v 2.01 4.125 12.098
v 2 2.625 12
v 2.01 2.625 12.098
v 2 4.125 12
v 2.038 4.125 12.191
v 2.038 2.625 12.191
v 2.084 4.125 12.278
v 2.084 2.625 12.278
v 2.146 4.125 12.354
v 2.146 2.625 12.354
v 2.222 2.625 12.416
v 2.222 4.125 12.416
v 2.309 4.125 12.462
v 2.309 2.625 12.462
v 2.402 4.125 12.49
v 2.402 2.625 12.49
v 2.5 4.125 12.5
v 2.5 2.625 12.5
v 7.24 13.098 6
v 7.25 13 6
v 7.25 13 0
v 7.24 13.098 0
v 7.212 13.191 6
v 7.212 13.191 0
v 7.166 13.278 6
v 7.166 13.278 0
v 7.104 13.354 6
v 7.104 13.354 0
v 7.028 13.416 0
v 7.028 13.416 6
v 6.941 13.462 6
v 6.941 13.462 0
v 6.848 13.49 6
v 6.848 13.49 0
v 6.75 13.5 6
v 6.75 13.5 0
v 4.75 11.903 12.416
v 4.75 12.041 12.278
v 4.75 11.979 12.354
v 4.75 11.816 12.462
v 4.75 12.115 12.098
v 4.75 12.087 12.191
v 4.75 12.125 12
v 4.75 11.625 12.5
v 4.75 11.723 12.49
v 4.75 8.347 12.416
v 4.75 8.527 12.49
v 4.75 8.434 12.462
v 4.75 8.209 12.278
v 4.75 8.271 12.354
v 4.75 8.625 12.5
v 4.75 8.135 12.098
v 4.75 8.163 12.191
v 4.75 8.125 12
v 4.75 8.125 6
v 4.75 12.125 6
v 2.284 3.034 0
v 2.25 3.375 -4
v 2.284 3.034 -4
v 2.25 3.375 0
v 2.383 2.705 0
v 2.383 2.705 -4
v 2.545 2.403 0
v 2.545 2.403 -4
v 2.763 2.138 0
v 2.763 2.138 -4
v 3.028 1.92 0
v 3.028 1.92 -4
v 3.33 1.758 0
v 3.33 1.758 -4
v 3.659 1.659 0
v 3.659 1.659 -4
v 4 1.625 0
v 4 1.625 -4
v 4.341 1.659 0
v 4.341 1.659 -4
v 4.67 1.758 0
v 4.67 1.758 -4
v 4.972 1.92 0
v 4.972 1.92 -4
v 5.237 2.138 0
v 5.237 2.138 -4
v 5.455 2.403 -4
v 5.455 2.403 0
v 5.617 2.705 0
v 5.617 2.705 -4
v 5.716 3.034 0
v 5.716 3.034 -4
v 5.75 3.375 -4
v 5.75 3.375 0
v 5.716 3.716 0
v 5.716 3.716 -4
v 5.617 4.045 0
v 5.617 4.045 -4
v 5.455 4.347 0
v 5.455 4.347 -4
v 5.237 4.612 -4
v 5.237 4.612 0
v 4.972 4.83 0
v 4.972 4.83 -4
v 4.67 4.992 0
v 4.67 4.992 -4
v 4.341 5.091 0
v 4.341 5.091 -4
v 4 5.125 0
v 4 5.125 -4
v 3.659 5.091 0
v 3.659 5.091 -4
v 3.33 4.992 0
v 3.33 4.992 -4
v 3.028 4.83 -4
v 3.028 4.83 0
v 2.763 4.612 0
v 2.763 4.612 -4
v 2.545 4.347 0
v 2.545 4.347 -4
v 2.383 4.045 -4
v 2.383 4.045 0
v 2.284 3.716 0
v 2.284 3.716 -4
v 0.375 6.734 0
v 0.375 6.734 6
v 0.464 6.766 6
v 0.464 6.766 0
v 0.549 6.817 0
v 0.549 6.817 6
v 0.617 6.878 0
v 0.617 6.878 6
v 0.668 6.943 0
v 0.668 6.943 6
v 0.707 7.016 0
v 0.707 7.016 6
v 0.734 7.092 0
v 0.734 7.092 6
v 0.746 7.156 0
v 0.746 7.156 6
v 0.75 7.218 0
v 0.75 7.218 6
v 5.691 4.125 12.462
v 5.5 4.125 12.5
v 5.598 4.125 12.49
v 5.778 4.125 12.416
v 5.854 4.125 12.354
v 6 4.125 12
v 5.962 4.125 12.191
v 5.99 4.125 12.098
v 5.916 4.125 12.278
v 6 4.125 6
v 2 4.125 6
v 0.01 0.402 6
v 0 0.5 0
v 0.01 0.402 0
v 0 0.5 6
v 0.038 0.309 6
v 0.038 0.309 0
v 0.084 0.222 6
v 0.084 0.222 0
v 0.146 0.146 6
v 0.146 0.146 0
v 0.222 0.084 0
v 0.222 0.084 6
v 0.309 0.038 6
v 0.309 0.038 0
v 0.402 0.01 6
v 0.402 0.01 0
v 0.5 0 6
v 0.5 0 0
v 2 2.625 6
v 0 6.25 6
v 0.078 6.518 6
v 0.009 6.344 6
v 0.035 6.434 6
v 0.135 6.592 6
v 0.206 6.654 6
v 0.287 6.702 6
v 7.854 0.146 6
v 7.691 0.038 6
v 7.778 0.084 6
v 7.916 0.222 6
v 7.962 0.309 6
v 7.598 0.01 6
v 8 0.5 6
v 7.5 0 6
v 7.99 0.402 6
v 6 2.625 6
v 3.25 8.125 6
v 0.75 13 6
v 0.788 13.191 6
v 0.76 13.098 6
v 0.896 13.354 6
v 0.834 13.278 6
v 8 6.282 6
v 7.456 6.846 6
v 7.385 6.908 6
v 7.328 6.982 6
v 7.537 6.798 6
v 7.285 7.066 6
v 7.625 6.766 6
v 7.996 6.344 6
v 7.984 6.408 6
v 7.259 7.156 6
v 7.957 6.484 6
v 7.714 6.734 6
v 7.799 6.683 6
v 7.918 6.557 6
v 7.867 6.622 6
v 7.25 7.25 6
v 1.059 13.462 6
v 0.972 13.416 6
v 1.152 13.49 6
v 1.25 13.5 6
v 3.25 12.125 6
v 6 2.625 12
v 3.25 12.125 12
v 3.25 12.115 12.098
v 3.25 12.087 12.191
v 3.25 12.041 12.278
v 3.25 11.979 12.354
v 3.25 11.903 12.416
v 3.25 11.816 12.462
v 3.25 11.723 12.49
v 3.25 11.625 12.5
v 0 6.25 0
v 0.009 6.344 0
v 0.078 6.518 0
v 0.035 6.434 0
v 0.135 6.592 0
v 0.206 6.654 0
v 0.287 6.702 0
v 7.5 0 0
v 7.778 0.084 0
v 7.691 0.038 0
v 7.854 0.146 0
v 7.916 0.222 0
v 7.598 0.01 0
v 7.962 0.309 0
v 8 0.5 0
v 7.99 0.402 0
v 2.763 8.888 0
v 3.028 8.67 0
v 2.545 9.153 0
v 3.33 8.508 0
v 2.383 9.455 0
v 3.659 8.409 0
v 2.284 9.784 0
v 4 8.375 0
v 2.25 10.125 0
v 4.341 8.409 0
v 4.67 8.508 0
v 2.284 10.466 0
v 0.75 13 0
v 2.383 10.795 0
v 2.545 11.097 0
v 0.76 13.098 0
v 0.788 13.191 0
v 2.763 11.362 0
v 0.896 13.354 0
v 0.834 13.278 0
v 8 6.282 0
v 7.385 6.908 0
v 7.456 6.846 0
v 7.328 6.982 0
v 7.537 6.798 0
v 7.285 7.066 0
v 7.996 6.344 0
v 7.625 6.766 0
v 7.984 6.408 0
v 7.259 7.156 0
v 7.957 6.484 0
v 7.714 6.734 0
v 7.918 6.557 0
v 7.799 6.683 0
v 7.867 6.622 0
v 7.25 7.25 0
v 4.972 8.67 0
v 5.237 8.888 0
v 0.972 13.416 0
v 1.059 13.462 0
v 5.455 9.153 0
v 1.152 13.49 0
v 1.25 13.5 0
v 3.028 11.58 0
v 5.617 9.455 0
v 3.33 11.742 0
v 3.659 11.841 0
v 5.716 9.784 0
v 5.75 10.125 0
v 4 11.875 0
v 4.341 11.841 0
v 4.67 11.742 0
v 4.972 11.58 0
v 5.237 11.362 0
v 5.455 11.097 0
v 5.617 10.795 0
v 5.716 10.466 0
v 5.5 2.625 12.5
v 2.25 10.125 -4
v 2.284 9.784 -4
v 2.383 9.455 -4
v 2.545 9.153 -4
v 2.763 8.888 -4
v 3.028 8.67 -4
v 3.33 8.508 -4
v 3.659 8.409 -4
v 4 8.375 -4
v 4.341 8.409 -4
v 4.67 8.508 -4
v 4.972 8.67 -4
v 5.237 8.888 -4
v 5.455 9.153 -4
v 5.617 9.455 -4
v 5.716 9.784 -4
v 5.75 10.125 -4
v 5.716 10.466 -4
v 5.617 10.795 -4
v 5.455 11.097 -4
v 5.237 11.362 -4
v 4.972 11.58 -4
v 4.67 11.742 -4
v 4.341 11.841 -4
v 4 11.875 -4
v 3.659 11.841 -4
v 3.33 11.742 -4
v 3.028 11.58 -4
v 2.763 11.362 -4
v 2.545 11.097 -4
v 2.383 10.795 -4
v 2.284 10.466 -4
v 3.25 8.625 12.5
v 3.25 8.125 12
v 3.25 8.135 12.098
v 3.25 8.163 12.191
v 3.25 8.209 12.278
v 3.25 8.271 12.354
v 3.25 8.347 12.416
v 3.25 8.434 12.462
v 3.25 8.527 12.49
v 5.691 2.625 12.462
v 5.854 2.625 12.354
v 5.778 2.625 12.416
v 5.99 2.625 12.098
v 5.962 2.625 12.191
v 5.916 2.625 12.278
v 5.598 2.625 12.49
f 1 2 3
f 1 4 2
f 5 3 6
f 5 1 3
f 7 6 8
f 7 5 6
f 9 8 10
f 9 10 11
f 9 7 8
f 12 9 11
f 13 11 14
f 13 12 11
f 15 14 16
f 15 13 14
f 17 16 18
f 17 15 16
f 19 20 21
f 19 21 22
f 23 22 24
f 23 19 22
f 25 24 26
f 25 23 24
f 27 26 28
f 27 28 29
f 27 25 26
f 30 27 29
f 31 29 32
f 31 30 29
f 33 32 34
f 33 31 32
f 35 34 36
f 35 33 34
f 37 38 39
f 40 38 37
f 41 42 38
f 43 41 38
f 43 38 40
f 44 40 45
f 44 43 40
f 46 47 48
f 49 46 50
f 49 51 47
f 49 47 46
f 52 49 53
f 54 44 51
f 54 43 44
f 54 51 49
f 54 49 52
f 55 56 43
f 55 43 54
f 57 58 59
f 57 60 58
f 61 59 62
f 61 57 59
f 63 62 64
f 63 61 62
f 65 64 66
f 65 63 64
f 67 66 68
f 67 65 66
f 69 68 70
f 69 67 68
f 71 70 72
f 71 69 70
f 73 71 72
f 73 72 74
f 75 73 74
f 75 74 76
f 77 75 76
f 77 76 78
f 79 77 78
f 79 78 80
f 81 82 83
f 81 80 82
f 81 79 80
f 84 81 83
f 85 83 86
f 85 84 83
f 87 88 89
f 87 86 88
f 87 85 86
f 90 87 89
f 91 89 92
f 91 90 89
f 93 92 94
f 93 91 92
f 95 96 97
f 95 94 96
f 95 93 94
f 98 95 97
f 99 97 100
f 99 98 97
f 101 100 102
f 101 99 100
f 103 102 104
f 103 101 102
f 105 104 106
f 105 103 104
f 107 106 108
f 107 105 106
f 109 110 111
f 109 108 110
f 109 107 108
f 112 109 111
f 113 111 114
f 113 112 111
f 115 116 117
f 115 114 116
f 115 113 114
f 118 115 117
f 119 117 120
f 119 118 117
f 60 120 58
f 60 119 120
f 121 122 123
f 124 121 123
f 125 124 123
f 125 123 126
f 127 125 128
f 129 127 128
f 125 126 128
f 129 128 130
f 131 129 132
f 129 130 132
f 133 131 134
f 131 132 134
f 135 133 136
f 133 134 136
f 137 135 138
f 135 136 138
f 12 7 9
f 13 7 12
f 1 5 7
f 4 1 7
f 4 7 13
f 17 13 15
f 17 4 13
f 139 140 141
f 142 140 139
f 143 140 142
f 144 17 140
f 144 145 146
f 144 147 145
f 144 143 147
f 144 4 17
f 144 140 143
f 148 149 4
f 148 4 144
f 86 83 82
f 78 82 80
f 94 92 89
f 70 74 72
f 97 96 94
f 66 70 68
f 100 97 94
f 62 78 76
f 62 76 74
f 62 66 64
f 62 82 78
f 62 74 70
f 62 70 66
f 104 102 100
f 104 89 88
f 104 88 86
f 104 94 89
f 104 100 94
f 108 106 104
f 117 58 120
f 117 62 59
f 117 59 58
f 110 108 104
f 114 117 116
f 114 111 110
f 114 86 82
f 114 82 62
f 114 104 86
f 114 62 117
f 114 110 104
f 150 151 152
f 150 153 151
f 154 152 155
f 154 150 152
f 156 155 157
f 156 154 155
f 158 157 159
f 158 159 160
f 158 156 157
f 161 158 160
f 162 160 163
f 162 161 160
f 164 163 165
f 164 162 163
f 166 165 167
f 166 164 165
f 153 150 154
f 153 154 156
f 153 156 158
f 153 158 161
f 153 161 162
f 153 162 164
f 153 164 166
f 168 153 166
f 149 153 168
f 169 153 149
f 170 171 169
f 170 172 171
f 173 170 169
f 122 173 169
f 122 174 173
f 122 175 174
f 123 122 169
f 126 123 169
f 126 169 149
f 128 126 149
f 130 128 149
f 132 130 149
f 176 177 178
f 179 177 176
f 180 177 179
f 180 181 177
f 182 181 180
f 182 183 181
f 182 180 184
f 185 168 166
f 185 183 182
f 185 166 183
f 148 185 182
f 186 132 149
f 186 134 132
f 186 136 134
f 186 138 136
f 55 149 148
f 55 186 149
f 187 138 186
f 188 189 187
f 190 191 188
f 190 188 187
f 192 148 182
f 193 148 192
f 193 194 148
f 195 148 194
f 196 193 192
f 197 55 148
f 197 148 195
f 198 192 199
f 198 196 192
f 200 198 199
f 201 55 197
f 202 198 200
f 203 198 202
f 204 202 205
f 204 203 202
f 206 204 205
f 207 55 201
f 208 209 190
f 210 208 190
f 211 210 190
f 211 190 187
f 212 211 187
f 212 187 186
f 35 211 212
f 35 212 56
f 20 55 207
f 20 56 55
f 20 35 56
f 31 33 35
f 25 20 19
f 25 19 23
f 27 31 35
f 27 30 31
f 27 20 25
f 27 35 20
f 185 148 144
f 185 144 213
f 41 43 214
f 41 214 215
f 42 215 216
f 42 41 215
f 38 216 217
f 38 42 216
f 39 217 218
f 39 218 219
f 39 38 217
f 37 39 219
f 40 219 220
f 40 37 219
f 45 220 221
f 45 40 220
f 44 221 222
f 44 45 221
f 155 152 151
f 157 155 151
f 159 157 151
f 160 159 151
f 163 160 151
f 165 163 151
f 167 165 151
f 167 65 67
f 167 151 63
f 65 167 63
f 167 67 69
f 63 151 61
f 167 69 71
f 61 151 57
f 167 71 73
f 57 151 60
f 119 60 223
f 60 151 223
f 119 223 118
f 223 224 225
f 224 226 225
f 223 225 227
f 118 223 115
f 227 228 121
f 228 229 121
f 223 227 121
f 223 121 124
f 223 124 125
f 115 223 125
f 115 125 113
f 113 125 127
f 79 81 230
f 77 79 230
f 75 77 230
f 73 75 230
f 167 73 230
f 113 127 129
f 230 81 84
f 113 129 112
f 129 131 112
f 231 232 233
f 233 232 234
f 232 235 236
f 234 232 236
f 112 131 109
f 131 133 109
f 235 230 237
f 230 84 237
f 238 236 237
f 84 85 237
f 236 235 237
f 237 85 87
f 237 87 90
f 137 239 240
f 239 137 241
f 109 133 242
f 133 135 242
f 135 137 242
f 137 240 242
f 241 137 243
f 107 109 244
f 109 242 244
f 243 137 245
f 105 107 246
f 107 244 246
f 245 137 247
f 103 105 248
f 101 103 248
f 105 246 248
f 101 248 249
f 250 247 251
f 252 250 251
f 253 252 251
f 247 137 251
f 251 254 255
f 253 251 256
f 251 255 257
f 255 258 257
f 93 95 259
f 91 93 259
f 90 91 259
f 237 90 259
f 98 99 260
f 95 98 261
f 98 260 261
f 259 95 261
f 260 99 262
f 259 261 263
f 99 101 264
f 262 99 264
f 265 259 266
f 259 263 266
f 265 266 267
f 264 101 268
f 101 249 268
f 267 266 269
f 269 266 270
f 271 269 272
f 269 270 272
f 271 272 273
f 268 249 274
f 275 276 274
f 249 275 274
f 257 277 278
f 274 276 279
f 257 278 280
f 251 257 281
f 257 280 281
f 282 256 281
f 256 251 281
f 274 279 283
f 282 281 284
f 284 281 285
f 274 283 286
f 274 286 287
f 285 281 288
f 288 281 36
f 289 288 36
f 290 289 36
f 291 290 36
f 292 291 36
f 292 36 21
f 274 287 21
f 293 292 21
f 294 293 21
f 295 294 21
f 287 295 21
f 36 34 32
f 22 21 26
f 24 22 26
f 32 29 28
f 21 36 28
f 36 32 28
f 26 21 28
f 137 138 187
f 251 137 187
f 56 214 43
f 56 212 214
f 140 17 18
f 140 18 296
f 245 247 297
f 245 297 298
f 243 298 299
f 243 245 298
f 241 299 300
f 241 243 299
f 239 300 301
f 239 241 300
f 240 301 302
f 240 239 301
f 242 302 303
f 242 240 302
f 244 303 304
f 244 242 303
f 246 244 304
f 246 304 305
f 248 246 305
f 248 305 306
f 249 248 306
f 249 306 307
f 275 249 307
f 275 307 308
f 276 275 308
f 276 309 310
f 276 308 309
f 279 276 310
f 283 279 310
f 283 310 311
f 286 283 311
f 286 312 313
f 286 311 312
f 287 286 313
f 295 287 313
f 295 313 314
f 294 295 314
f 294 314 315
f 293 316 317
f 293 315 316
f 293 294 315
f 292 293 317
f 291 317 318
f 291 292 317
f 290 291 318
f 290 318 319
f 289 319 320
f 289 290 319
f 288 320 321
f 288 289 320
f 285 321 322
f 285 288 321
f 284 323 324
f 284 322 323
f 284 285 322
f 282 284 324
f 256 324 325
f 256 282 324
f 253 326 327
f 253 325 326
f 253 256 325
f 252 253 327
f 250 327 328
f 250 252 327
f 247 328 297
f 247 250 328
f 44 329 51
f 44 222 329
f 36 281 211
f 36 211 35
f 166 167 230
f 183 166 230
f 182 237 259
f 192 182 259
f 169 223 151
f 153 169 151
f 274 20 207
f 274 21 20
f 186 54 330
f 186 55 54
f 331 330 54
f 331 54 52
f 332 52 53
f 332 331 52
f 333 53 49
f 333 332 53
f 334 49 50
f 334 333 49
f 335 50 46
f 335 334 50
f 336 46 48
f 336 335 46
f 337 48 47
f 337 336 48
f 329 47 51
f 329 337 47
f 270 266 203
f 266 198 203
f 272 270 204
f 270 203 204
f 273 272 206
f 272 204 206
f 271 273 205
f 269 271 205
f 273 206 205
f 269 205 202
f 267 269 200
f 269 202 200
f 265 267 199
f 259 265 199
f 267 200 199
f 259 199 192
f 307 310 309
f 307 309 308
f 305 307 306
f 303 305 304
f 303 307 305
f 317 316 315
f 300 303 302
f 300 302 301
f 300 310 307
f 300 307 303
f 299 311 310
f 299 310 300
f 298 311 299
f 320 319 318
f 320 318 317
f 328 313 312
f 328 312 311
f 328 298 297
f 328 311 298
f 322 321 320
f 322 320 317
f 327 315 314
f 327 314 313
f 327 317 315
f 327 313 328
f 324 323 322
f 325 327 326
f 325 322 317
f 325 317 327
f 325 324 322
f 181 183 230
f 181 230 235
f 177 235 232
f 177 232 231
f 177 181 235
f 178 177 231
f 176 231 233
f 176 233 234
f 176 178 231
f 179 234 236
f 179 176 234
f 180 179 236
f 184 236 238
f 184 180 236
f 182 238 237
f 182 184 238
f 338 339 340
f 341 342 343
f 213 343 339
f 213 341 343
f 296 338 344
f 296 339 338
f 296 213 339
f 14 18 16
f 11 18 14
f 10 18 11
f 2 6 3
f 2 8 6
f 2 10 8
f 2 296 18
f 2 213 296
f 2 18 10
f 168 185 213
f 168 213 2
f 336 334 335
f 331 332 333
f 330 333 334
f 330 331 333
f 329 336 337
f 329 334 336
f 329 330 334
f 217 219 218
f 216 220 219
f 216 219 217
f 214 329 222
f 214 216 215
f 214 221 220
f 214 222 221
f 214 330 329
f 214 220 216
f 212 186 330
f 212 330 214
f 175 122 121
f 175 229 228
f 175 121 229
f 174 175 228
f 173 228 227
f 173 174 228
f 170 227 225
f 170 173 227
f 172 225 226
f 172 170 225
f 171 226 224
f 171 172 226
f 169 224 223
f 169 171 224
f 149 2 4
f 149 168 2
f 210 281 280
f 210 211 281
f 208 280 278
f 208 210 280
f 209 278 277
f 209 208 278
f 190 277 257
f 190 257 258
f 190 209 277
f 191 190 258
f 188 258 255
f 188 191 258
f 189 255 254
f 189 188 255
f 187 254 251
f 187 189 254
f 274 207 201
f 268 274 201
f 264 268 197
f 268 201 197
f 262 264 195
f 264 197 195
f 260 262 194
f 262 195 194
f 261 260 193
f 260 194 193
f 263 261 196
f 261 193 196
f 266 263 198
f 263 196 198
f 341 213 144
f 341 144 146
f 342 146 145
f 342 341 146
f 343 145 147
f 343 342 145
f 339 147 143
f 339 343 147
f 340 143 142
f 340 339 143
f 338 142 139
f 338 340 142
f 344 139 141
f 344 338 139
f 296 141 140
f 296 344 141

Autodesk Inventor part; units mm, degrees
ref_plane "YZ Plane" through (0, 0, 0) normal (1, 0, 0) x (0, 1, 0)
ref_plane "XZ Plane" through (0, 0, 0) normal (0, 1, 0) x (-1, 0, 0)
ref_plane "XY Plane" through (0, 0, 0) normal (0, 0, 1) x (1, 0, 0)
sketch "Sketch1" plane through (0, 0, 0) normal (0, 0, 1) x (1, 0, 0)
  line L0 (4, 9.5) -> (4, 4) construction
  line L1 (0.75, 6.75) -> (0.75, 13.5)
  line L2 (0.75, 13.5) -> (7.25, 13.5)
  line L3 (7.25, 13.5) -> (7.25, 6.75)
  line L4 (0, 6.75) -> (0, 0)
  line L5 (0, 0) -> (8, 0)
  line L6 (8, 0) -> (8, 6.75)
  line L7 (0, 6.75) -> (0.75, 6.75)
  line L8 (7.25, 6.75) -> (8, 6.75)
  line L9 (0.75, 6.75) -> (7.25, 6.75) construction
  line L10 (4, 4) -> (4, 0) construction
  line L11 (4, 9.5) -> (4, 13.5) construction
  line L12 (3.25, 12.125) -> (4.75, 12.125)
  line L13 (4.75, 12.125) -> (4.75, 8.125)
  line L14 (4.75, 8.125) -> (3.25, 8.125)
  line L15 (3.25, 8.125) -> (3.25, 12.125)
  line L16 (2, 4.125) -> (6, 4.125)
  line L17 (6, 4.125) -> (6, 2.625)
  line L18 (6, 2.625) -> (2, 2.625)
  line L19 (2, 2.625) -> (2, 4.125)
  line L20 (4.75, 12.125) -> (4.75, 13.5) construction
  line L21 (4.75, 8.125) -> (4.75, 6.75) construction
  line L22 (6, 2.625) -> (6, 0) construction
  line L23 (6, 4.125) -> (6, 6.75) construction
  point P0 (4, 6.75)
  dimension "d2" = 5.5
  dimension "d3" = 6.5
  dimension "d4" = 8
  dimension "d5" = 13.5
  dimension "d9" = 1.5
  dimension "d10" = 4
  dimension "d11" = 4
  dimension "d12" = 1.5
extrude "Extrusion2" add sketch "Sketch1" along normal blind 6
fillet "Fillet2" radius 0.5 8 edges at (7.25, 6.75, 3) (8, 6.75, 3) (0, 6.75, 3) (0.75, 6.75, 3) (0, 0, 3) (8, 0, 3) (7.25, 13.5, 3) (0.75, 13.5, 3)
extrude "Extrusion3" add sketch "Sketch1" along normal blind 12.5 contours L12 L13 L14 L15 | L16 L17 L18 L19
sketch "Sketch2" plane through (0, 0, 0) normal (0, 0, -1) x (-1, 0, 0)
  line L0 (-6, 4.125) -> (-2, 4.125) construction
  line L1 (-2, 4.125) -> (-2, 2.625) construction
  line L2 (-2, 2.625) -> (-6, 2.625) construction
  line L3 (-6, 2.625) -> (-6, 4.125) construction
  line L4 (-4.75, 12.125) -> (-3.25, 12.125) construction
  line L5 (-3.25, 12.125) -> (-3.25, 8.125) construction
  line L6 (-3.25, 8.125) -> (-4.75, 8.125) construction
  line L7 (-4.75, 8.125) -> (-4.75, 12.125) construction
  line L8 (-3.25, 8.125) -> (-3.25, 12.125) construction
  line L9 (-3.25, 12.125) -> (-4.75, 8.125) construction
  line L10 (-3.25, 12.125) -> (-4.75, 12.125) construction
  line L11 (-3.25, 8.125) -> (-4.75, 12.125) construction
  line L12 (-2, 4.125) -> (-6, 2.625) construction
  line L13 (-6, 2.625) -> (-2, 2.625) construction
  line L14 (-6, 2.625) -> (-6, 4.125) construction
  line L15 (-2, 2.625) -> (-6, 4.125) construction
  circle A0 centre (-4, 10.125) radius 1.75
  circle A1 centre (-4, 3.375) radius 1.75
  point P0 (0, 0)
  dimension "d18" = 3.5
  dimension "d19" = 3.5
extrude "Extrusion4" add sketch "Sketch2" along normal blind 4
fillet "Fillet3" radius 0.5 4 edges at (4, 12.125, 12.5) (4, 8.125, 12.5) (2, 3.375, 12.5) (6, 3.375, 12.5)
properties part number "Tplug"
